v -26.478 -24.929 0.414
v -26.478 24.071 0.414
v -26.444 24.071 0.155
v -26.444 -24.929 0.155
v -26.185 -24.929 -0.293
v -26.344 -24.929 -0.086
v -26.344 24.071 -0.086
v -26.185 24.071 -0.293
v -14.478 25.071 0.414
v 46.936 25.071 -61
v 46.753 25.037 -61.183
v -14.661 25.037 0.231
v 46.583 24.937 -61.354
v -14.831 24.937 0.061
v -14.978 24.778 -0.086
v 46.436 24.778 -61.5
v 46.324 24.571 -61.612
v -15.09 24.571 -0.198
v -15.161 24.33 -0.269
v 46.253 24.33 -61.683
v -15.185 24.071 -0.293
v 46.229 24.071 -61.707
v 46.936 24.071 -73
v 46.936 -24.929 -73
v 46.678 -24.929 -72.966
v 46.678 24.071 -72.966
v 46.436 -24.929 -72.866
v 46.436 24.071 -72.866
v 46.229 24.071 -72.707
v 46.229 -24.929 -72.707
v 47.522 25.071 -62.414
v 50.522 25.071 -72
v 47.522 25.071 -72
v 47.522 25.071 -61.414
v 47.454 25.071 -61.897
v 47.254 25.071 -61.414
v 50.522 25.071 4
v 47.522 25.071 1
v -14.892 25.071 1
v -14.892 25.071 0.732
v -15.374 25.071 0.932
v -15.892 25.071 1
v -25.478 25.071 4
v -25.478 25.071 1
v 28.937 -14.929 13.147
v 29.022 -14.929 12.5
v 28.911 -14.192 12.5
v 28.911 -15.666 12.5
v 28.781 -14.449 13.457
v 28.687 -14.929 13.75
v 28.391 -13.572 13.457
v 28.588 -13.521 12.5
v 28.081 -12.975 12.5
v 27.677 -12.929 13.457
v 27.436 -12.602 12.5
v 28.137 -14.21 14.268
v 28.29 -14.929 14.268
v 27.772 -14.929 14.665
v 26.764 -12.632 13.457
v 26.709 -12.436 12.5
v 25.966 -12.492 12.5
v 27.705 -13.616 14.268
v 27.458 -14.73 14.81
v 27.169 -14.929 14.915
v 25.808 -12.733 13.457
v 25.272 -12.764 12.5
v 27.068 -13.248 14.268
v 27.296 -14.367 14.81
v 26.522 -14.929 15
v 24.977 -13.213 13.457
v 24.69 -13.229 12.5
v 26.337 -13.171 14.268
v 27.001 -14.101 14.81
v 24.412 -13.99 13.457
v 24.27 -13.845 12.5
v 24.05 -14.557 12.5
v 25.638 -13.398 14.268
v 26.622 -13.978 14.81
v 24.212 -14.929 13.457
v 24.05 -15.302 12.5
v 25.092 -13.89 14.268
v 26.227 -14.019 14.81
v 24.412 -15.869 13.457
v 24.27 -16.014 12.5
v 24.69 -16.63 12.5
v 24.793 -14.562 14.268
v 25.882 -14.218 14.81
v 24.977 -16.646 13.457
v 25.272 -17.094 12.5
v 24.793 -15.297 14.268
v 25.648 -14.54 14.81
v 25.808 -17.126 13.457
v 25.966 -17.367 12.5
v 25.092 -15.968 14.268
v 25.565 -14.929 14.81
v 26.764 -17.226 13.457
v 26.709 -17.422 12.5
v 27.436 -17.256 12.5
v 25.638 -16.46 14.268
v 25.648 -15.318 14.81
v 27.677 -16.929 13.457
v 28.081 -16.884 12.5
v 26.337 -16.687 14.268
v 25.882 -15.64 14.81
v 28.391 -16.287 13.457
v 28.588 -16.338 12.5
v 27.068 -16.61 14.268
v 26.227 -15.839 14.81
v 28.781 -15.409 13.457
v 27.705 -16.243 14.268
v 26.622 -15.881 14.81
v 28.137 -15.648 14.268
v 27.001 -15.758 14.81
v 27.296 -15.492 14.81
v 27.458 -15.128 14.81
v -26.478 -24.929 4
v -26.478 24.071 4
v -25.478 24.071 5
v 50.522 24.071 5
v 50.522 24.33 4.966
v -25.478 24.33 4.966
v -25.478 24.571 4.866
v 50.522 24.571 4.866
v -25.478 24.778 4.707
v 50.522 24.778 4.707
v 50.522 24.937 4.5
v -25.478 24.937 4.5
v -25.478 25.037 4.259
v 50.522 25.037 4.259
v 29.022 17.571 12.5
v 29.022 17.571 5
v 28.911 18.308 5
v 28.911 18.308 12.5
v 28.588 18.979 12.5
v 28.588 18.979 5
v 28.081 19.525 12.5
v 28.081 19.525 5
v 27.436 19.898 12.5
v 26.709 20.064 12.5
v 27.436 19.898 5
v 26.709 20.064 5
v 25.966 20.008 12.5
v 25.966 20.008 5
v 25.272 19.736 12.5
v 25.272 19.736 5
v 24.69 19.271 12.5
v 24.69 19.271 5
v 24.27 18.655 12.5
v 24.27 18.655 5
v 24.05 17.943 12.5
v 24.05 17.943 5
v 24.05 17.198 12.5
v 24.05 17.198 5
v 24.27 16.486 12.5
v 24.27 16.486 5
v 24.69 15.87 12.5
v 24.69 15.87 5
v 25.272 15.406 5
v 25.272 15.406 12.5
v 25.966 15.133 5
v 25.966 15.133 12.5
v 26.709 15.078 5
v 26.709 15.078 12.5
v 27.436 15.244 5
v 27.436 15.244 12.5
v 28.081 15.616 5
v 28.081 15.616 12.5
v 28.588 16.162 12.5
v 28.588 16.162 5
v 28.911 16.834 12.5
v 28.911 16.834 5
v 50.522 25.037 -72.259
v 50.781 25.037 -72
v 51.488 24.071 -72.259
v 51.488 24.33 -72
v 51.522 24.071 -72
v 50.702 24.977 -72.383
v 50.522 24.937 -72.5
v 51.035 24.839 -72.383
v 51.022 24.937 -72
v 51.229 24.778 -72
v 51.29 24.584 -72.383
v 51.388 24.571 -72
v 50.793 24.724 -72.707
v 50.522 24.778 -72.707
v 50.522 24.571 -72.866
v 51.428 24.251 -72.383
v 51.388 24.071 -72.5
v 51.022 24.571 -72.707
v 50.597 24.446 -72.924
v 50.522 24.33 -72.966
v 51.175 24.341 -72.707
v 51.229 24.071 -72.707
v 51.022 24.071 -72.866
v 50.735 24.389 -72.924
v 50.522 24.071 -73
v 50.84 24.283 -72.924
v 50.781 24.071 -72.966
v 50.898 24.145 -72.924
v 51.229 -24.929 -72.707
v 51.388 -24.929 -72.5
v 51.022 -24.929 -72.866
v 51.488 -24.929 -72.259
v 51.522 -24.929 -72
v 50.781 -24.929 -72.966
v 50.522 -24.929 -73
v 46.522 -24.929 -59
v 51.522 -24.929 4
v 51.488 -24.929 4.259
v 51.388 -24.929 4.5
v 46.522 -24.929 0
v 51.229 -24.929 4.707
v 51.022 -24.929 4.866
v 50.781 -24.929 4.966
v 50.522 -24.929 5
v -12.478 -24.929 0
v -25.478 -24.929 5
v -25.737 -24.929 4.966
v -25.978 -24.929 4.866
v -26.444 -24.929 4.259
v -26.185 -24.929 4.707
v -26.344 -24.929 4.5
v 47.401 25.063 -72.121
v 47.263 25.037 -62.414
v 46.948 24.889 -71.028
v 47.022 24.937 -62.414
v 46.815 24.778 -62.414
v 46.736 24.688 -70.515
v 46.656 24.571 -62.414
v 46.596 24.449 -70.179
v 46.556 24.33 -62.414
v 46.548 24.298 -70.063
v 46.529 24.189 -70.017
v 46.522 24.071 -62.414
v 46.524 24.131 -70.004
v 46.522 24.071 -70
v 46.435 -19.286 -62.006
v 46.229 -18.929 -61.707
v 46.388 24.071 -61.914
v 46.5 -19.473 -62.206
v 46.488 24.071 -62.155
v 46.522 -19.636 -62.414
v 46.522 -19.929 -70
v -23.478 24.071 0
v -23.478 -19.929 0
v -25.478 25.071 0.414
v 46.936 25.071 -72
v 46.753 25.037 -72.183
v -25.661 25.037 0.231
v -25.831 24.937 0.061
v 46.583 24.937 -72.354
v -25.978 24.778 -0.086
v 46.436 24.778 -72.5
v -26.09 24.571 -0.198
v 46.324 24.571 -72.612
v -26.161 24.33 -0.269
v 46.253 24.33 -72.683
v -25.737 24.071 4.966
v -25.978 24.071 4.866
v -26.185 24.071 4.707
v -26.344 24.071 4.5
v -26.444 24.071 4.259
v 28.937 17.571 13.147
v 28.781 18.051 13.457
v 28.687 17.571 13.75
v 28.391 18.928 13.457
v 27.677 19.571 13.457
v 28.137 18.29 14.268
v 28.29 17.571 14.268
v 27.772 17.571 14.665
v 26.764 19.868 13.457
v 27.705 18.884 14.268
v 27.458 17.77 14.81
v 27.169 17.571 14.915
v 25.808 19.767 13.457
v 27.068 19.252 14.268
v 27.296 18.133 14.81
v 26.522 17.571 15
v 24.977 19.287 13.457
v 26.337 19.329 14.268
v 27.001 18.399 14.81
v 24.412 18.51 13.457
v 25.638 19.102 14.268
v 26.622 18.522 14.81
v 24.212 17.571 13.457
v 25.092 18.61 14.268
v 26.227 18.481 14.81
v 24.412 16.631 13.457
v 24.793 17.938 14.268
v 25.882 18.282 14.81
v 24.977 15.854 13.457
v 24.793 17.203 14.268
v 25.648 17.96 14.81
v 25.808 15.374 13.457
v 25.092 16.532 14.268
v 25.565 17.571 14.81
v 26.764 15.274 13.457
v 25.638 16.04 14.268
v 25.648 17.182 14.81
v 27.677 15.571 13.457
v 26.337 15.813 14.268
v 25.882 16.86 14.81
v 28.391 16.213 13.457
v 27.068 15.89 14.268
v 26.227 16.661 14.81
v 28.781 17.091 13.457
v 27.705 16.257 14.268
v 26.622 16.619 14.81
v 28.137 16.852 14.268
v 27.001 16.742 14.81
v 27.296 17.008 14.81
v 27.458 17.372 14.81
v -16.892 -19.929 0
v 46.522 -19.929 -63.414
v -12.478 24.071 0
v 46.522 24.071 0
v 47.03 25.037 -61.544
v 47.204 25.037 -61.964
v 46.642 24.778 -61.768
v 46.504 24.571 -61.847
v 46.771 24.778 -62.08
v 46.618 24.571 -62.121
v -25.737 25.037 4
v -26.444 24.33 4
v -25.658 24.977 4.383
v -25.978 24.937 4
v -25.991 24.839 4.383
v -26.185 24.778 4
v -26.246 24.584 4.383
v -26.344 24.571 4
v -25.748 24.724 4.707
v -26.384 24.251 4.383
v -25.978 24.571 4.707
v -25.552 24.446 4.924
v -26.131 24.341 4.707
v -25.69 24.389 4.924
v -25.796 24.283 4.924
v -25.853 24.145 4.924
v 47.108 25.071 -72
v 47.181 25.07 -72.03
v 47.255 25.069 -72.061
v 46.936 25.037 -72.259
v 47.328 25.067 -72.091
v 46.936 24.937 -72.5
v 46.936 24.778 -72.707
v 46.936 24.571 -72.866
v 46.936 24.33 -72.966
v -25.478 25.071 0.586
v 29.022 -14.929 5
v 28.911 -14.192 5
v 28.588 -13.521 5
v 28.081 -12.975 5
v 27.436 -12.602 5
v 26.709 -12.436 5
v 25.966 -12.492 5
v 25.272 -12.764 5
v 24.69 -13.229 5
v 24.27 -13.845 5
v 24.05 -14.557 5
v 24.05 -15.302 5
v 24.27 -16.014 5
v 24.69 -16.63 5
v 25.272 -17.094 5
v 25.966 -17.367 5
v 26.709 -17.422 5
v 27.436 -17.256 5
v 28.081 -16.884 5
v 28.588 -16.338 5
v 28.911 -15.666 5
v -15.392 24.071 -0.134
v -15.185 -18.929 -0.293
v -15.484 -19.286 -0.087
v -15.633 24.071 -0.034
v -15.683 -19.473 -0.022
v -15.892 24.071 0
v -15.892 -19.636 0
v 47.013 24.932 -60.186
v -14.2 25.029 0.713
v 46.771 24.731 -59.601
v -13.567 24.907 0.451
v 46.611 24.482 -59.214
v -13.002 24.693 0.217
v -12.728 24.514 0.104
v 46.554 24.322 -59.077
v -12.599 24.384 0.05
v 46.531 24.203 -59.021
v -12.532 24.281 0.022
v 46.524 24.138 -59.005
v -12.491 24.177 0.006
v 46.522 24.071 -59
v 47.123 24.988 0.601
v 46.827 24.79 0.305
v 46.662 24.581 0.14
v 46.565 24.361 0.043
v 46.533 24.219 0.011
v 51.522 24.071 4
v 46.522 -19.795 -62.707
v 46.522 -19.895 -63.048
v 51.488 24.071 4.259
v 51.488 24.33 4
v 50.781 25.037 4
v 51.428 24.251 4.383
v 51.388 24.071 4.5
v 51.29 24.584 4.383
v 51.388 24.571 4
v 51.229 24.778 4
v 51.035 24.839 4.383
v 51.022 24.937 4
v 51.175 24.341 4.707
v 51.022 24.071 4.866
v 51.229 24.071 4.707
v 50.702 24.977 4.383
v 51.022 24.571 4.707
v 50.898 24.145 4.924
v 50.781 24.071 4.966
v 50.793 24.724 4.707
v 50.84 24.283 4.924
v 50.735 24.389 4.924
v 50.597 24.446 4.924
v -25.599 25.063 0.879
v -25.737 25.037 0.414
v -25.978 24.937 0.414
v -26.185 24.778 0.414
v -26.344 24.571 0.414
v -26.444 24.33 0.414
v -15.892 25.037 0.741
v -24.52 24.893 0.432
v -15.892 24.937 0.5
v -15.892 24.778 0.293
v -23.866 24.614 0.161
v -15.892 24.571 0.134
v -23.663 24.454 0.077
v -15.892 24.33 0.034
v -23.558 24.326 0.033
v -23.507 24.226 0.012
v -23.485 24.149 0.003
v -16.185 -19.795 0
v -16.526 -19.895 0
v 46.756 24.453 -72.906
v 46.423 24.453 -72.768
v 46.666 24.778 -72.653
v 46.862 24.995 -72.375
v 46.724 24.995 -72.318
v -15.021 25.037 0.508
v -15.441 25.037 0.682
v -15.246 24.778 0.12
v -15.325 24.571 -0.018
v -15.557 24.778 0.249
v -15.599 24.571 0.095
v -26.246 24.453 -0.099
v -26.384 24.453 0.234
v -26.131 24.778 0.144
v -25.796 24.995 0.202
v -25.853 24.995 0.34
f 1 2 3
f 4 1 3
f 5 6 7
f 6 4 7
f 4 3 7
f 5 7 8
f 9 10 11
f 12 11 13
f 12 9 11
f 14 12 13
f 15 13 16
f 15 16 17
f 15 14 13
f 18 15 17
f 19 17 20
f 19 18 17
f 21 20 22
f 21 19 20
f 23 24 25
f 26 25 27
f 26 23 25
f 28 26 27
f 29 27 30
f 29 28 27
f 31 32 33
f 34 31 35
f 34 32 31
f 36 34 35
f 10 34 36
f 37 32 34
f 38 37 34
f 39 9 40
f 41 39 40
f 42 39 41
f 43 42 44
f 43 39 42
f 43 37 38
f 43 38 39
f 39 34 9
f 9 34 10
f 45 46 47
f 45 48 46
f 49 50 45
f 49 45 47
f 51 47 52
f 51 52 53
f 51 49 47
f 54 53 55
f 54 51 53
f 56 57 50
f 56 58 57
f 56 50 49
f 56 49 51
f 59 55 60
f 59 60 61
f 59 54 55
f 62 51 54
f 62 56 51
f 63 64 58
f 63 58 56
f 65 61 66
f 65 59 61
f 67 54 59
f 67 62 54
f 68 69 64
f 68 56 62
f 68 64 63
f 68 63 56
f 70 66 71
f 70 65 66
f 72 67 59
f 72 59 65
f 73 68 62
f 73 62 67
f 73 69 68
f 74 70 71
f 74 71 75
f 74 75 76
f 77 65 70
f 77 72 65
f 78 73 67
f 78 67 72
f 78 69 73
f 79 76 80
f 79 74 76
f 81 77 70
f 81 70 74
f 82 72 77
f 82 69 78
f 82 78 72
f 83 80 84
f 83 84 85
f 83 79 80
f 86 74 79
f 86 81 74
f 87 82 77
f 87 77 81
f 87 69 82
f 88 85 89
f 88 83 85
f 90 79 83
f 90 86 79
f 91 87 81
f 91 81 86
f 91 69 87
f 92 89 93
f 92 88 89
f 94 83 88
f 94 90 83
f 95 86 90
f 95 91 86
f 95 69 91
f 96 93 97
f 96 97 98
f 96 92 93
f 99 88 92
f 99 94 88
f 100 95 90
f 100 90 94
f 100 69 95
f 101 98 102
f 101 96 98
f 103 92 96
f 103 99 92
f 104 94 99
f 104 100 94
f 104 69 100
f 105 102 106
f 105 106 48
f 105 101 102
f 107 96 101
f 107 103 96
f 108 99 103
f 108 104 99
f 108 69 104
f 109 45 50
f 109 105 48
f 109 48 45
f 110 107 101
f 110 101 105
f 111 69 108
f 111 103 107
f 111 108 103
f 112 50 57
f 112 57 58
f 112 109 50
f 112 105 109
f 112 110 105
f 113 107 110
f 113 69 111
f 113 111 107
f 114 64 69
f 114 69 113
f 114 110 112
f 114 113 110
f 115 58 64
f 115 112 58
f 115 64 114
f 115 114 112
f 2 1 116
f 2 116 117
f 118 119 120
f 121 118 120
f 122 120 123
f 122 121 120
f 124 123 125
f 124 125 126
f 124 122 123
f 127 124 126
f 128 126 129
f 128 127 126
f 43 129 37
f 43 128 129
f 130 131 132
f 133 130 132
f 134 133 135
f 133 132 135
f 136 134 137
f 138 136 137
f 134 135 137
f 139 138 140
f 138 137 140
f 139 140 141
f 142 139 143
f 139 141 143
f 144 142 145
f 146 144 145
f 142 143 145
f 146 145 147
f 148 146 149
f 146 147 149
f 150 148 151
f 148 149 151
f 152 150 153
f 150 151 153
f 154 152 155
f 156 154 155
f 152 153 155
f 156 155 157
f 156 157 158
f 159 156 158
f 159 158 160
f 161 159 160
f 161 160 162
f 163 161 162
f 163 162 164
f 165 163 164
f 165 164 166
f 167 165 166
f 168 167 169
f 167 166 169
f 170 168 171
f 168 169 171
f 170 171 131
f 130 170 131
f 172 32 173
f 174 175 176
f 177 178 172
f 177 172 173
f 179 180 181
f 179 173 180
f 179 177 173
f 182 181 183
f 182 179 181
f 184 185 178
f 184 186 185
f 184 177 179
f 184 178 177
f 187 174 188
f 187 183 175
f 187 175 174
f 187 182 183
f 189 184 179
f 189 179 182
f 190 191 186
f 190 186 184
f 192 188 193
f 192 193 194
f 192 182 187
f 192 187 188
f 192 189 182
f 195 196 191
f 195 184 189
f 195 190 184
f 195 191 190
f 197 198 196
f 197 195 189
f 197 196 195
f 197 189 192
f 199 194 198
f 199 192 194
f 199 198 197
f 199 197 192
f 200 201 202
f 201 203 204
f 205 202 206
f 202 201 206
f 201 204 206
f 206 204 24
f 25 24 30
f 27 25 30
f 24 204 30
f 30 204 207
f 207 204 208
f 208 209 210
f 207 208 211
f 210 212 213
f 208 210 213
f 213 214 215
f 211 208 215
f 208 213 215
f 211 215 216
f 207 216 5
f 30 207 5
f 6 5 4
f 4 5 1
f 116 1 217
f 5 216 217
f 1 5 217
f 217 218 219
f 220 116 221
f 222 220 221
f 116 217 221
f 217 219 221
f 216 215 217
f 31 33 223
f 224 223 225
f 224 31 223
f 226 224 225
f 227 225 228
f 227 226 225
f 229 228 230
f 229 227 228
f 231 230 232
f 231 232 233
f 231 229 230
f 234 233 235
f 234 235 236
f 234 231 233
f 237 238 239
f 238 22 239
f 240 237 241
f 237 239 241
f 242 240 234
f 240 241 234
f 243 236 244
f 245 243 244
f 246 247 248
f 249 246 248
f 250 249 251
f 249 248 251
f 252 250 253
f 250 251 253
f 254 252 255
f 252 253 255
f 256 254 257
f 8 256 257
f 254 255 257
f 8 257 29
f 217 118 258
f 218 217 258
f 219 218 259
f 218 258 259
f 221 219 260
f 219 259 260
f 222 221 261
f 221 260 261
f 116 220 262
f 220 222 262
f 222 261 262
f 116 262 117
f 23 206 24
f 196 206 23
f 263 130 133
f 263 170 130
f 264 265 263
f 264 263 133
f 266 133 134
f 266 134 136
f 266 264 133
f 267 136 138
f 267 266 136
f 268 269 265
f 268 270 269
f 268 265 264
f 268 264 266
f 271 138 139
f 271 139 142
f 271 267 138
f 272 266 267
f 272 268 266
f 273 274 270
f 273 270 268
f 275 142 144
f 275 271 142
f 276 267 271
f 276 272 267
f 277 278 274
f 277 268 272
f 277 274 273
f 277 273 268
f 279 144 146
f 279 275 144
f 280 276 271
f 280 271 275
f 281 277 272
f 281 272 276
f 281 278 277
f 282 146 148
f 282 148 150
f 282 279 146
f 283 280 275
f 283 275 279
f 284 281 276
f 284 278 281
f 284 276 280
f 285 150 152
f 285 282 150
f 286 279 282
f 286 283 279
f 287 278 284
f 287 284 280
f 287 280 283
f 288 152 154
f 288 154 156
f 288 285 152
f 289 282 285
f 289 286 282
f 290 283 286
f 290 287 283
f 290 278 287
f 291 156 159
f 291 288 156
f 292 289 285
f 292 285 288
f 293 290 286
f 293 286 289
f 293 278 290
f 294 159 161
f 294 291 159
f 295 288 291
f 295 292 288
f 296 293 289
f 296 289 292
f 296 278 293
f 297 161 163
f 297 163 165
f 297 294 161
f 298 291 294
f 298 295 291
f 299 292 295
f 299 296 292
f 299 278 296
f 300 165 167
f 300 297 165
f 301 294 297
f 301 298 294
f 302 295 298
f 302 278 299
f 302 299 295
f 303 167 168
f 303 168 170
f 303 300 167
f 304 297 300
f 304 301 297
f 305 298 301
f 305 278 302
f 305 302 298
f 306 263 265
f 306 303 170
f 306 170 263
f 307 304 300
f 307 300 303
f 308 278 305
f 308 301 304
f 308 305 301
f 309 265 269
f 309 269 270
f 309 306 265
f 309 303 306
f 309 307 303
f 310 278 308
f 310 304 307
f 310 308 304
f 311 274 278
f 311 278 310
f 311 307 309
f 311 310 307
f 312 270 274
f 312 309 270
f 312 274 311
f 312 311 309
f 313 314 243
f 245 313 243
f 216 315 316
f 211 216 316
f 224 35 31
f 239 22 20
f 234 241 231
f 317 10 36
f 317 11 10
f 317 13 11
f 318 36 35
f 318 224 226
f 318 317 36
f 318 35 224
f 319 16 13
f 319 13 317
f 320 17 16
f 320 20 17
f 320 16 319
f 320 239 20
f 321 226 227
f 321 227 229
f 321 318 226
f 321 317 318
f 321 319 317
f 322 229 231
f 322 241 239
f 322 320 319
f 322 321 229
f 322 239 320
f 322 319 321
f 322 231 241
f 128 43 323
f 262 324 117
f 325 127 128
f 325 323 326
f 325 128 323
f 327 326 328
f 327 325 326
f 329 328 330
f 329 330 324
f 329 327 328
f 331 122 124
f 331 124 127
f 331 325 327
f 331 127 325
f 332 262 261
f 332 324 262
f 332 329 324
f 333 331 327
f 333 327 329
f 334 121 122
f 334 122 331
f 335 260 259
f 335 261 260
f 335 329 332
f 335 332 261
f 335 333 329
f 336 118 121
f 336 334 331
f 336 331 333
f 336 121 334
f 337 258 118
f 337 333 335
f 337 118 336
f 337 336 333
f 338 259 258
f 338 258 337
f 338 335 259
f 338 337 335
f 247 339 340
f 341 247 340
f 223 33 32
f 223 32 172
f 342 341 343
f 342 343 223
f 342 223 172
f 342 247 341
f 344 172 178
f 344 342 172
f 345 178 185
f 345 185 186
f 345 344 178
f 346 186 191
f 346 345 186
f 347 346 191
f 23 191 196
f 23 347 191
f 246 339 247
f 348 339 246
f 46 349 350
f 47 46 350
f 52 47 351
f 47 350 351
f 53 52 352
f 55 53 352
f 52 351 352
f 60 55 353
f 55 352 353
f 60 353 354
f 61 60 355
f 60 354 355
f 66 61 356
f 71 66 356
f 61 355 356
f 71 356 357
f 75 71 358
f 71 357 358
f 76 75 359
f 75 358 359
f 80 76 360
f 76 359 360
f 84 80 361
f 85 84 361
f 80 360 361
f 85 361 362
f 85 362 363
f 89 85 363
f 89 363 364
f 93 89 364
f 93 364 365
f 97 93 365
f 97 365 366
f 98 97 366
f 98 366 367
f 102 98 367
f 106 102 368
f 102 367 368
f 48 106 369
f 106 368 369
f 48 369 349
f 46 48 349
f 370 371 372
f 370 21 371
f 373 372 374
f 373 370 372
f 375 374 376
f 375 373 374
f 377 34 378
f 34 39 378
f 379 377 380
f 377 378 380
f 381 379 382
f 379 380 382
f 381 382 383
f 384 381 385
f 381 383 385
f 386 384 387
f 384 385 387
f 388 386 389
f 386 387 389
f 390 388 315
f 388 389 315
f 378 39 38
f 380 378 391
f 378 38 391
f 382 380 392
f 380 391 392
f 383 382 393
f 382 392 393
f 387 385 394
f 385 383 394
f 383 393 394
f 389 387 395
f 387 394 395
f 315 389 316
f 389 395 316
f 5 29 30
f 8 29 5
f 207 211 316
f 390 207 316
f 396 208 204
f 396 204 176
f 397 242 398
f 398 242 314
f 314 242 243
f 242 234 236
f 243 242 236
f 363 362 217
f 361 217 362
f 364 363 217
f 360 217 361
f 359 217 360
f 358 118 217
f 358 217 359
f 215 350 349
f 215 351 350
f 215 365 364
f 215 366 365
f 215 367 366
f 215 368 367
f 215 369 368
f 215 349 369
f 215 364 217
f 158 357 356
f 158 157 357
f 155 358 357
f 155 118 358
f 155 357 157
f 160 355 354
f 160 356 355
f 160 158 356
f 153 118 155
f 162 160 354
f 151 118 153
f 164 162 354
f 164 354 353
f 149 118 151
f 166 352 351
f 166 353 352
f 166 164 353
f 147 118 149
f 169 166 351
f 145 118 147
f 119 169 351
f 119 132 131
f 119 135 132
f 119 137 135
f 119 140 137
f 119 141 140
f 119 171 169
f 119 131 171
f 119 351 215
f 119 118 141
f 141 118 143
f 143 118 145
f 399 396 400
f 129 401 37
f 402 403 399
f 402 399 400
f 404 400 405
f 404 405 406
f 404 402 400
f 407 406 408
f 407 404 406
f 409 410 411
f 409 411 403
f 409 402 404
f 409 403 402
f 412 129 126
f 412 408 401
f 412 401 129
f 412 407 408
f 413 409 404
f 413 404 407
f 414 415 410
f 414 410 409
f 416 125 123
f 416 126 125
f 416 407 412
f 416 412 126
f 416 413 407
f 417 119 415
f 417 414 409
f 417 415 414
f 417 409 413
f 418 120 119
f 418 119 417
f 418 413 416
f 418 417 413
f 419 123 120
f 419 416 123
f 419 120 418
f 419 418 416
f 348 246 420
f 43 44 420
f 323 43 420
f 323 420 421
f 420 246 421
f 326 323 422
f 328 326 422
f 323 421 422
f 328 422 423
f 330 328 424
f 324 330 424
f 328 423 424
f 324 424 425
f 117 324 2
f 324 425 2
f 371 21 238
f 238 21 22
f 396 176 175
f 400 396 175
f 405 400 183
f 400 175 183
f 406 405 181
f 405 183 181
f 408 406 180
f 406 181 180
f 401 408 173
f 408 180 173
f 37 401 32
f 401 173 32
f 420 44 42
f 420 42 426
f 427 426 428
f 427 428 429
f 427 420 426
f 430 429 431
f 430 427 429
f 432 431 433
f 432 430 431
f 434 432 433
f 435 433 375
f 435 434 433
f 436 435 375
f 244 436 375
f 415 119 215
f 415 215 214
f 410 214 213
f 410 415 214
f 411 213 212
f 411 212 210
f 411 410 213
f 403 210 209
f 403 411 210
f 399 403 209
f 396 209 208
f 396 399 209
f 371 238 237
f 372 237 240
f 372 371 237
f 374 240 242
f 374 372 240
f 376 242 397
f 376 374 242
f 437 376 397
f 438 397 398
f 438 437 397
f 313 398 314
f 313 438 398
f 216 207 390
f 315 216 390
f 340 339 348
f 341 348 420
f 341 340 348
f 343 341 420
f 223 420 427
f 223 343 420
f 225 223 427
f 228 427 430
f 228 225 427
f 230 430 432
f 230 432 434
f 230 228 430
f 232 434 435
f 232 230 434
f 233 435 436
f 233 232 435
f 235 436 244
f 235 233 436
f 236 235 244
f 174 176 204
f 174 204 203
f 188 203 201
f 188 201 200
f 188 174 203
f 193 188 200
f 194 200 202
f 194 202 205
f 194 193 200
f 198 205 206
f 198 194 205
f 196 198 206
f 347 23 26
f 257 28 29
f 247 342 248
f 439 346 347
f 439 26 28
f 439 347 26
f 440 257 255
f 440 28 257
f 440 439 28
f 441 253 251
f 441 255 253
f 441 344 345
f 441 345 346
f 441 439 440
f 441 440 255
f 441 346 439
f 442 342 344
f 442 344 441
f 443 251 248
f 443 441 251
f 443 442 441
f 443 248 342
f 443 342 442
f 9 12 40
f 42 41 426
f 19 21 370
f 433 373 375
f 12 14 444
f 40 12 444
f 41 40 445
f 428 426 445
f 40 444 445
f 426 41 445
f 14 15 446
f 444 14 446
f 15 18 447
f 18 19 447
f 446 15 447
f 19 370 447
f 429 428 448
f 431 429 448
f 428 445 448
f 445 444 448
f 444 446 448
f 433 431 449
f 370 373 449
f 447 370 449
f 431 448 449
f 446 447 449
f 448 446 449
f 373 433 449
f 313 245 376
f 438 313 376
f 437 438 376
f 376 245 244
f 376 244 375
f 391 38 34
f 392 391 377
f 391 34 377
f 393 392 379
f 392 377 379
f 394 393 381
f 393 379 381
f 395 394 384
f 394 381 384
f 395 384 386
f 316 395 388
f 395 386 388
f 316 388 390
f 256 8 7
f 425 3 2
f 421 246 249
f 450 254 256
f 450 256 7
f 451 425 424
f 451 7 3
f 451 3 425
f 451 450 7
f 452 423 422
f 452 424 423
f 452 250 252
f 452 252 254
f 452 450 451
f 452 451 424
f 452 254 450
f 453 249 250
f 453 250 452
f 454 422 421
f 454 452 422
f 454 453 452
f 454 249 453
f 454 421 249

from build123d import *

# Parameters (mm, degrees)
F0_W           = 78
F0_H           = 50
F1_DEPTH       = 5
F2_R           = 2.5
F3_DEPTH       = 10
F4_R           = 2.5
F5_W           = 50
F5_H           = 78
F6_DEPTH       = 5
F8_DEPTH       = 50
F10_DEPTH      = 45
F11_T1_DEPTH   = 46.0355339059
F11_T3_DEPTH   = 92.6812408671
F11_T5_DEPTH   = 86.8528137424
F11_T7_DEPTH   = 76
F11_T9_DEPTH   = 76
F11_T11_DEPTH  = 3.5857864376
F11_T13_DEPTH  = 102.4091629285
F11_T15_DEPTH  = 3.5857864376
F11_T17_DEPTH  = 51.5
F11_T19_DEPTH  = 50.0355339059
F11_S23_W      = 1.02
F11_S23_H      = 1.02
F11_T24_DEPTH  = 1.02
F11_S29_W      = 1.02
F11_S29_H      = 1.02
F11_T30_DEPTH  = 1.02
F11_S35_W      = 1.02
F11_S35_H      = 1.02
F11_T36_DEPTH  = 1.02
F11_T42_DEPTH  = 1.02
F11_T48_DEPTH  = 1.02
F11_T54_DEPTH  = 61.5
F11_T59_DEPTH  = 61.5
F11_T64_DEPTH  = 88.43860018
F11_T70_DEPTH  = 103.9949493661
F11_T76_DEPTH  = 10.0857864376
F11_T81_DEPTH  = 10.0857864376
F11_T84_ANGLE  = 45
F11_T86_ANGLE  = 45
F11_T91_DEPTH  = 64
F11_T95_DEPTH  = 64
F11_T102_DEPTH = 61.5
F11_T106_DEPTH = 88.43860018
F11_T113_DEPTH = 61.5
F11_T117_DEPTH = 88.43860018
F11_T124_DEPTH = 10.0857864376
F11_T128_DEPTH = 103.9949493661
F11_T135_DEPTH = 103.9949493661
F11_T139_DEPTH = 10.0857864376


# Not quite as in the source:
# - a fillet or chamfer that OpenCascade refuses, or shapes differently, is made with other operations: its cross-section is extruded or revolved along the edge and cut away or added


with BuildPart() as f1:
    # F0 (on Top) → F1 (new body)
    with BuildSketch(Plane.XY):
        with Locations((12.5221835672, 0.070781447)):
            Rectangle(F0_W, F0_H)
    extrude(amount=F1_DEPTH)

    # F2 (on face) → F3 (join)
    with BuildSketch(Plane.XY.offset(5)):
        with Locations((26.5221835672, 17.570781447)):
            Circle(F2_R)
        with Locations((26.5221835672, -14.929218553)):
            Circle(F2_R)
    extrude(amount=F3_DEPTH)

    # F4
    f4_edges = [f1.edges().sort_by_distance(p)[0] for p in [
        (24.022184, 17.570781, 15),
        (24.022184, -14.929219, 15),
    ]]
    fillet(f4_edges, radius=F4_R)

    # F5 (on face) → F6 (join)
    with BuildSketch(Plane.YZ.offset(51.5221835672)):
        with Locations((0.070781447, -34)):
            Rectangle(F5_W, F5_H)
    extrude(amount=-F6_DEPTH)

    # F7 (on face) → F8 (join)
    with BuildSketch(Plane(origin=(0, 25.070781447, 0), x_dir=(-1, 0, 0), z_dir=(0, 1, 0))):
        Polygon((-46.5221835672, -73), (26.4778164328, 0), (12.4778164328, 0), (-46.5221835672, -59), align=None)
    extrude(amount=-F8_DEPTH)

    # F9 (on face) → F10 (cut)
    with BuildSketch(Plane(origin=(0, 25.070781447, 0), x_dir=(-1, 0, 0), z_dir=(0, 1, 0))):
        Polygon((15.4778164328, 0), (-46.5221835672, -62), (-46.5221835672, -70), (23.4778164328, 0), align=None)
    extrude(amount=-F10_DEPTH, mode=Mode.SUBTRACT)

    # F11: fillet of radius 1 on 20 edges, made by hand

    # F11_s2 → F11_t1 (join)
    with BuildSketch(Plane.XZ.offset(-25.070781447)):
        with BuildLine():
            ThreePointArc((-15.1849232139, -0.2928932188), (-15.5093465628, -0.0761204675), (-15.8920299951, 0))
            Line((-15.8920299951, 0), (-15.4778164328, 0))
            Line((-15.4778164328, 0), (-15.1849232139, -0.2928932188))
        make_face()
        with BuildLine():
            ThreePointArc((46.2292903484, -61.7071067812), (46.4460630998, -62.03153013), (46.5221835672, -62.4142135624))
            Line((46.5221835672, -62.4142135624), (46.5221835672, -62))
            Line((46.5221835672, -62), (46.2292903484, -61.7071067812))
        make_face()
    extrude(amount=F11_T1_DEPTH)

    # F11_s4 → F11_t3 (join)
    with BuildSketch(Plane(origin=(-9.5066751693, 0, 9.5066751693), x_dir=(0, 1, 0), z_dir=(0.7071067812, 0, -0.7071067812))):
        with BuildLine():
            ThreePointArc((-18.929218553, -10.9444689576), (-19.6363253342, -11.2373621764), (-19.929218553, -11.9444689576))
            Line((-19.929218553, -11.9444689576), (-19.929218553, -10.9444689576))
            Line((-19.929218553, -10.9444689576), (-18.929218553, -10.9444689576))
        make_face()
    extrude(amount=F11_T3_DEPTH)

    # F11_s6 → F11_t5 (cut)
    with BuildSketch(Plane(origin=(-7.4460149976, 0, 7.4460149976), x_dir=(0, 1, 0), z_dir=(0.7071067812, 0, -0.7071067812))):
        with BuildLine():
            ThreePointArc((25.070781447, -9.9444689576), (24.7778882282, -10.6515757388), (24.070781447, -10.9444689576))
            Line((24.070781447, -10.9444689576), (25.070781447, -10.9444689576))
            Line((25.070781447, -10.9444689576), (25.070781447, -9.9444689576))
        make_face()
    extrude(amount=F11_T5_DEPTH, mode=Mode.SUBTRACT)

    # F11_s8 → F11_t7 (cut)
    with BuildSketch(Plane.YZ.offset(-25.4778164328)):
        with BuildLine():
            ThreePointArc((24.070781447, 5), (24.7778882282, 4.7071067812), (25.070781447, 4))
            Line((25.070781447, 4), (25.070781447, 5))
            Line((25.070781447, 5), (24.070781447, 5))
        make_face()
    extrude(amount=F11_T7_DEPTH, mode=Mode.SUBTRACT)

    # F11_s10 → F11_t9 (cut)
    with BuildSketch(Plane.XY.offset(-72)):
        with BuildLine():
            ThreePointArc((51.5221835672, 24.070781447), (51.2292903484, 24.7778882282), (50.5221835672, 25.070781447))
            Line((50.5221835672, 25.070781447), (51.5221835672, 25.070781447))
            Line((51.5221835672, 25.070781447), (51.5221835672, 24.070781447))
        make_face()
    extrude(amount=F11_T9_DEPTH, mode=Mode.SUBTRACT)

    # F11_s12 → F11_t11 (cut)
    with BuildSketch(Plane.YZ.offset(46.9363971296)):
        with BuildLine():
            ThreePointArc((25.070781447, -72), (24.7778882282, -72.7071067812), (24.070781447, -73))
            Line((24.070781447, -73), (25.070781447, -73))
            Line((25.070781447, -73), (25.070781447, -72))
        make_face()
    extrude(amount=F11_T11_DEPTH, mode=Mode.SUBTRACT)

    # F11_s14 → F11_t13 (cut)
    with BuildSketch(Plane(origin=(59.4681985648, 0, -59.4681985648), x_dir=(0, 1, 0), z_dir=(-0.7071067812, 0, 0.7071067812))):
        with BuildLine():
            ThreePointArc((25.070781447, 17.7226435506), (24.7778882282, 18.4297503318), (24.070781447, 18.7226435506))
            Line((24.070781447, 18.7226435506), (25.070781447, 18.7226435506))
            Line((25.070781447, 18.7226435506), (25.070781447, 17.7226435506))
        make_face()
    extrude(amount=F11_T13_DEPTH, mode=Mode.SUBTRACT)

    # F11_s16 → F11_t15 (cut)
    with BuildSketch(Plane.XY.offset(0.4142135624)):
        with BuildLine():
            ThreePointArc((-25.4778164328, 25.070781447), (-26.1849232139, 24.7778882282), (-26.4778164328, 24.070781447))
            Line((-26.4778164328, 24.070781447), (-26.4778164328, 25.070781447))
            Line((-26.4778164328, 25.070781447), (-25.4778164328, 25.070781447))
        make_face()
    extrude(amount=F11_T15_DEPTH, mode=Mode.SUBTRACT)

    # F11_s18 → F11_t17 (cut)
    with BuildSketch(Plane.XZ.offset(-24.070781447)):
        with BuildLine():
            ThreePointArc((51.5221835672, -72), (51.2292903484, -72.7071067812), (50.5221835672, -73))
            Line((50.5221835672, -73), (51.5221835672, -73))
            Line((51.5221835672, -73), (51.5221835672, -72))
        make_face()
        with BuildLine():
            ThreePointArc((50.5221835672, 5), (51.2292903484, 4.7071067812), (51.5221835672, 4))
            Line((51.5221835672, 4), (51.5221835672, 5))
            Line((51.5221835672, 5), (50.5221835672, 5))
        make_face()
        with BuildLine():
            ThreePointArc((-25.4778164328, 5), (-26.1849232139, 4.7071067812), (-26.4778164328, 4))
            Line((-26.4778164328, 4), (-26.4778164328, 5))
            Line((-26.4778164328, 5), (-25.4778164328, 5))
        make_face()
    extrude(amount=F11_T17_DEPTH, mode=Mode.SUBTRACT)

    # F11_s20 → F11_t19 (cut)
    with BuildSketch(Plane.XZ.offset(-24.070781447)):
        with BuildLine():
            ThreePointArc((46.9363971296, -73), (46.5537136972, -72.9238795325), (46.2292903484, -72.7071067812))
            Line((46.2292903484, -72.7071067812), (46.5221835672, -73))
            Line((46.5221835672, -73), (46.9363971296, -73))
        make_face()
        with BuildLine():
            ThreePointArc((-26.4778164328, 0.4142135624), (-26.4016959653, 0.03153013), (-26.1849232139, -0.2928932188))
            Line((-26.1849232139, -0.2928932188), (-26.4778164328, 0))
            Line((-26.4778164328, 0), (-26.4778164328, 0.4142135624))
        make_face()
    extrude(amount=F11_T19_DEPTH, mode=Mode.SUBTRACT)


with BuildPart() as f11_tool22:
    # F11_s23 → F11_t24 (new body)
    with BuildSketch(Plane.XY.offset(4)):
        with Locations((51.0321835672, 24.580781447)):
            Rectangle(F11_S23_W, F11_S23_H)
    extrude(amount=F11_T24_DEPTH)

    # F11_s25 → F11_t26 (revolve, cut)
    with BuildSketch(Plane(origin=(50.5221835672, 24.070781447, 4), x_dir=(-0.7071067812, -0.7071067812, 0), z_dir=(-0.7071067812, 0.7071067812, 0))):
        with BuildLine():
            ThreePointArc((0, -1), (1, 0), (0, 1))
            Line((0, 1), (0, -1))
        make_face()
    revolve(axis=Axis((50.5221835672, 24.070781447, 4), (0, 0, 1)), mode=Mode.SUBTRACT)


with BuildPart() as f1_1:
    add(f1.part)

    # F11_t21: cut F11_tool22
    add(f11_tool22.part, mode=Mode.SUBTRACT)


with BuildPart() as f11_tool28:
    # F11_s29 → F11_t30 (new body)
    with BuildSketch(Plane.XY.offset(4)):
        with Locations((-25.9878164328, 24.580781447)):
            Rectangle(F11_S29_W, F11_S29_H)
    extrude(amount=F11_T30_DEPTH)

    # F11_s31 → F11_t32 (revolve, cut)
    with BuildSketch(Plane(origin=(-25.4778164328, 24.070781447, 4), x_dir=(0.7071067812, -0.7071067812, 0), z_dir=(-0.7071067812, -0.7071067812, 0))):
        with BuildLine():
            ThreePointArc((0, -1), (1, 0), (0, 1))
            Line((0, 1), (0, -1))
        make_face()
    revolve(axis=Axis((-25.4778164328, 24.070781447, 4), (0, 0, 1)), mode=Mode.SUBTRACT)


with BuildPart() as f1_2:
    add(f1_1.part)

    # F11_t27: cut F11_tool28
    add(f11_tool28.part, mode=Mode.SUBTRACT)


with BuildPart() as f11_tool34:
    # F11_s35 → F11_t36 (new body)
    with BuildSketch(Plane.XY.offset(-72)):
        with Locations((51.0321835672, 24.580781447)):
            Rectangle(F11_S35_W, F11_S35_H)
    extrude(amount=-F11_T36_DEPTH)

    # F11_s37 → F11_t38 (revolve, cut)
    with BuildSketch(Plane(origin=(50.5221835672, 24.070781447, -72), x_dir=(-0.7071067812, -0.7071067812, 0), z_dir=(0.7071067812, -0.7071067812, 0))):
        with BuildLine():
            ThreePointArc((0, -1), (1, 0), (0, 1))
            Line((0, 1), (0, -1))
        make_face()
    revolve(axis=Axis((50.5221835672, 24.070781447, -72), (0, 0, -1)), mode=Mode.SUBTRACT)


with BuildPart() as f1_3:
    add(f1_2.part)

    # F11_t33: cut F11_tool34
    add(f11_tool34.part, mode=Mode.SUBTRACT)


with BuildPart() as f11_tool40:
    # F11_s41 → F11_t42 (new body)
    with BuildSketch(Plane.XZ.offset(-24.070781447)):
        Polygon((46.9363971296, -72), (46.9363971296, -73.02), (46.513899296, -73.02), (46.2151482128, -72.7212489168), align=None)
    extrude(amount=-F11_T42_DEPTH)

    # F11_s43 → F11_t44 (revolve, cut)
    with BuildSketch(Plane(origin=(46.9363971296, 24.070781447, -72), x_dir=(0.3826834324, 0, 0.9238795325), z_dir=(-0.9238795325, 0, 0.3826834324))):
        with BuildLine():
            ThreePointArc((0, -1), (1, 0), (0, 1))
            Line((0, 1), (0, -1))
        make_face()
    revolve(axis=Axis((46.9363971296, 24.070781447, -72), (0, 1, 0)), mode=Mode.SUBTRACT)


with BuildPart() as f1_4:
    add(f1_3.part)

    # F11_t39: cut F11_tool40
    add(f11_tool40.part, mode=Mode.SUBTRACT)


with BuildPart() as f11_tool46:
    # F11_s47 → F11_t48 (new body)
    with BuildSketch(Plane.XZ.offset(-24.070781447)):
        Polygon((-25.4778164328, 0.4142135624), (-26.4978164328, 0.4142135624), (-26.4978164328, -0.0082842712), (-26.1990653496, -0.3070353544), align=None)
    extrude(amount=-F11_T48_DEPTH)

    # F11_s49 → F11_t50 (revolve, cut)
    with BuildSketch(Plane(origin=(-25.4778164328, 24.070781447, 0.4142135624), x_dir=(0.9238795325, 0, 0.3826834324), z_dir=(-0.3826834324, 0, 0.9238795325))):
        with BuildLine():
            ThreePointArc((0, -1), (1, 0), (0, 1))
            Line((0, 1), (0, -1))
        make_face()
    revolve(axis=Axis((-25.4778164328, 24.070781447, 0.4142135624), (0, 1, 0)), mode=Mode.SUBTRACT)


with BuildPart() as f1_5:
    add(f1_4.part)

    # F11_t45: cut F11_tool46
    add(f11_tool46.part, mode=Mode.SUBTRACT)


with BuildPart() as f11_tool52:
    # F11_s53 → F11_t54 (new body)
    with BuildSketch(Plane.YZ.offset(46.5221835672)):
        with BuildLine():
            ThreePointArc((25.070781447, 1), (24.7778882282, 0.2928932188), (24.070781447, 0))
            Line((24.070781447, 0), (25.070781447, 0))
            Line((25.070781447, 0), (25.070781447, 1))
        make_face()
    extrude(amount=-F11_T54_DEPTH)

    split(bisect_by=Plane(origin=(-6.2389082164, 0, -6.2389082164), x_dir=(0, 1, 0), z_dir=(0.7071067812, 0, 0.7071067812)), keep=Keep.TOP)


with BuildPart() as f1_6:
    add(f1_5.part)

    # F11_t51: cut F11_tool52
    add(f11_tool52.part, mode=Mode.SUBTRACT)


with BuildPart() as f11_tool57:
    # F11_s58 → F11_t59 (new body)
    with BuildSketch(Plane.XY.offset(-61.5)):
        with BuildLine():
            ThreePointArc((47.5221835672, 25.070781447), (46.8150767861, 24.7778882282), (46.5221835672, 24.070781447))
            Line((46.5221835672, 24.070781447), (46.5221835672, 25.070781447))
            Line((46.5221835672, 25.070781447), (47.5221835672, 25.070781447))
        make_face()
    extrude(amount=F11_T59_DEPTH)

    split(bisect_by=Plane(origin=(-6.2389082164, 0, -6.2389082164), x_dir=(0, 1, 0), z_dir=(0.7071067812, 0, 0.7071067812)), keep=Keep.TOP)


with BuildPart() as f1_7:
    add(f1_6.part)

    # F11_t56: cut F11_tool57
    add(f11_tool57.part, mode=Mode.SUBTRACT)


with BuildPart() as f11_tool62:
    # F11_s63 → F11_t64 (new body)
    with BuildSketch(Plane(origin=(-8.0066751693, 0, 8.0066751693), x_dir=(0, 1, 0), z_dir=(0.7071067812, 0, -0.7071067812))):
        with BuildLine():
            ThreePointArc((25.070781447, -9.823148614), (24.7778882282, -9.1160418328), (24.070781447, -8.823148614))
            Line((24.070781447, -8.823148614), (25.070781447, -8.823148614))
            Line((25.070781447, -8.823148614), (25.070781447, -9.823148614))
        make_face()
    extrude(amount=F11_T64_DEPTH)

    split(bisect_by=Plane.XY, keep=Keep.BOTTOM)

    split(bisect_by=Plane.YZ.offset(46.5221835672), keep=Keep.BOTTOM)


with BuildPart() as f1_8:
    add(f1_7.part)

    # F11_t61: cut F11_tool62
    add(f11_tool62.part, mode=Mode.SUBTRACT)


with BuildPart() as f11_tool68:
    # F11_s69 → F11_t70 (new body)
    with BuildSketch(Plane(origin=(60.0288587366, 0, -60.0288587366), x_dir=(0, 1, 0), z_dir=(-0.7071067812, 0, 0.7071067812))):
        with BuildLine():
            ThreePointArc((25.070781447, 17.6013232071), (24.7778882282, 16.8942164259), (24.070781447, 16.6013232071))
            Line((24.070781447, 16.6013232071), (25.070781447, 16.6013232071))
            Line((25.070781447, 16.6013232071), (25.070781447, 17.6013232071))
        make_face()
    extrude(amount=F11_T70_DEPTH)

    split(bisect_by=Plane.XY, keep=Keep.BOTTOM)

    split(bisect_by=Plane.YZ.offset(46.5221835672), keep=Keep.BOTTOM)


with BuildPart() as f1_9:
    add(f1_8.part)

    # F11_t67: cut F11_tool68
    add(f11_tool68.part, mode=Mode.SUBTRACT)


with BuildPart() as f11_tool74:
    # F11_s75 → F11_t76 (new body)
    with BuildSketch(Plane.YZ.offset(-25.9778164328)):
        with BuildLine():
            ThreePointArc((25.070781447, 1), (24.7778882282, 0.2928932188), (24.070781447, 0))
            Line((24.070781447, 0), (25.070781447, 0))
            Line((25.070781447, 0), (25.070781447, 1))
        make_face()
    extrude(amount=F11_T76_DEPTH)

    split(bisect_by=Plane(origin=(-11.7389082164, 0, -11.7389082164), x_dir=(0, 1, 0), z_dir=(0.7071067812, 0, 0.7071067812)), keep=Keep.TOP)


with BuildPart() as f1_10:
    add(f1_9.part)

    # F11_t73: cut F11_tool74
    add(f11_tool74.part, mode=Mode.SUBTRACT)


with BuildPart() as f11_tool79:
    # F11_s80 → F11_t81 (new body)
    with BuildSketch(Plane.XY.offset(-62.4142135624)):
        with BuildLine():
            ThreePointArc((47.5221835672, 25.070781447), (46.8150767861, 24.7778882282), (46.5221835672, 24.070781447))
            Line((46.5221835672, 24.070781447), (46.5221835672, 25.070781447))
            Line((46.5221835672, 25.070781447), (47.5221835672, 25.070781447))
        make_face()
    extrude(amount=-F11_T81_DEPTH)

    split(bisect_by=Plane(origin=(-11.7389082164, 0, -11.7389082164), x_dir=(0, 1, 0), z_dir=(0.7071067812, 0, 0.7071067812)), keep=Keep.TOP)


with BuildPart() as f1_11:
    add(f1_10.part)

    # F11_t78: cut F11_tool79
    add(f11_tool79.part, mode=Mode.SUBTRACT)

    # F11_s83 → F11_t84 (revolve, cut)
    with BuildSketch(Plane(origin=(53.9681985648, 0, -53.9681985648), x_dir=(0, 1, 0), z_dir=(-0.7071067812, 0, 0.7071067812))):
        with BuildLine():
            ThreePointArc((25.070781447, 9.9444689576), (24.7778882282, 10.6515757388), (24.070781447, 10.9444689576))
            Line((24.070781447, 10.9444689576), (25.070781447, 10.9444689576))
            Line((25.070781447, 10.9444689576), (25.070781447, 9.9444689576))
        make_face()
    revolve(axis=Axis((45.5221835672, 25.070781447, -62.4142135624), (0, 1, 0)), revolution_arc=F11_T84_ANGLE, mode=Mode.SUBTRACT)

    # F11_s85 → F11_t86 (revolve, cut)
    with BuildSketch(Plane(origin=(-7.4460149976, 0, 7.4460149976), x_dir=(0, 1, 0), z_dir=(0.7071067812, 0, -0.7071067812))):
        with BuildLine():
            ThreePointArc((25.070781447, -9.9444689576), (24.7778882282, -10.6515757388), (24.070781447, -10.9444689576))
            Line((24.070781447, -10.9444689576), (25.070781447, -10.9444689576))
            Line((25.070781447, -10.9444689576), (25.070781447, -9.9444689576))
        make_face()
    revolve(axis=Axis((-15.8920299951, 25.070781447, -1), (0, -1, 0)), revolution_arc=F11_T86_ANGLE, mode=Mode.SUBTRACT)


with BuildPart() as f11_tool89:
    # F11_s90 → F11_t91 (new body)
    with BuildSketch(Plane.YZ.offset(49.0221835672)):
        with BuildLine():
            ThreePointArc((25.070781447, 1), (24.7778882282, 0.2928932188), (24.070781447, 0))
            Line((24.070781447, 0), (25.070781447, 0))
            Line((25.070781447, 0), (25.070781447, 1))
        make_face()
    extrude(amount=-F11_T91_DEPTH)

    split(bisect_by=Plane.YZ.offset(46.5221835672), keep=Keep.TOP)


with BuildPart() as f11_tool93:
    # F11_s94 → F11_t95 (new body)
    with BuildSketch(Plane.XY.offset(-61.5)):
        with BuildLine():
            ThreePointArc((47.5221835672, 25.070781447), (46.8150767861, 24.7778882282), (46.5221835672, 24.070781447))
            Line((46.5221835672, 24.070781447), (46.5221835672, 25.070781447))
            Line((46.5221835672, 25.070781447), (47.5221835672, 25.070781447))
        make_face()
    extrude(amount=F11_T95_DEPTH)

    split(bisect_by=Plane.XY, keep=Keep.TOP)


with BuildPart() as f11_tool89_1:
    add(f11_tool89.part)

    # F11_t97: intersect F11_tool93
    add(f11_tool93.part, mode=Mode.INTERSECT)


with BuildPart() as f1_12:
    add(f1_11.part)

    # F11_t87: cut F11_tool89
    add(f11_tool89_1.part, mode=Mode.SUBTRACT)


with BuildPart() as f11_tool100:
    # F11_s101 → F11_t102 (new body)
    with BuildSketch(Plane.YZ.offset(46.5221835672)):
        with BuildLine():
            ThreePointArc((25.070781447, 1), (24.7778882282, 0.2928932188), (24.070781447, 0))
            Line((24.070781447, 0), (25.070781447, 0))
            Line((25.070781447, 0), (25.070781447, 1))
        make_face()
    extrude(amount=-F11_T102_DEPTH)

    split(bisect_by=Plane(origin=(-6.2389082164, 0, -6.2389082164), x_dir=(0, 1, 0), z_dir=(-0.7071067812, 0, -0.7071067812)), keep=Keep.TOP)


with BuildPart() as f11_tool104:
    # F11_s105 → F11_t106 (new body)
    with BuildSketch(Plane(origin=(-8.0066751693, 0, 8.0066751693), x_dir=(0, 1, 0), z_dir=(0.7071067812, 0, -0.7071067812))):
        with BuildLine():
            ThreePointArc((25.070781447, -9.823148614), (24.7778882282, -9.1160418328), (24.070781447, -8.823148614))
            Line((24.070781447, -8.823148614), (25.070781447, -8.823148614))
            Line((25.070781447, -8.823148614), (25.070781447, -9.823148614))
        make_face()
    extrude(amount=F11_T106_DEPTH)

    split(bisect_by=Plane.XY, keep=Keep.TOP)


with BuildPart() as f11_tool100_1:
    add(f11_tool100.part)

    # F11_t108: intersect F11_tool104
    add(f11_tool104.part, mode=Mode.INTERSECT)


with BuildPart() as f1_13:
    add(f1_12.part)

    # F11_t98: cut F11_tool100
    add(f11_tool100_1.part, mode=Mode.SUBTRACT)


with BuildPart() as f11_tool111:
    # F11_s112 → F11_t113 (new body)
    with BuildSketch(Plane.XY.offset(-61.5)):
        with BuildLine():
            ThreePointArc((47.5221835672, 25.070781447), (46.8150767861, 24.7778882282), (46.5221835672, 24.070781447))
            Line((46.5221835672, 24.070781447), (46.5221835672, 25.070781447))
            Line((46.5221835672, 25.070781447), (47.5221835672, 25.070781447))
        make_face()
    extrude(amount=F11_T113_DEPTH)

    split(bisect_by=Plane(origin=(-6.2389082164, 0, -6.2389082164), x_dir=(0, 1, 0), z_dir=(-0.7071067812, 0, -0.7071067812)), keep=Keep.TOP)


with BuildPart() as f11_tool115:
    # F11_s116 → F11_t117 (new body)
    with BuildSketch(Plane(origin=(-8.0066751693, 0, 8.0066751693), x_dir=(0, 1, 0), z_dir=(0.7071067812, 0, -0.7071067812))):
        with BuildLine():
            ThreePointArc((25.070781447, -9.823148614), (24.7778882282, -9.1160418328), (24.070781447, -8.823148614))
            Line((24.070781447, -8.823148614), (25.070781447, -8.823148614))
            Line((25.070781447, -8.823148614), (25.070781447, -9.823148614))
        make_face()
    extrude(amount=F11_T117_DEPTH)

    split(bisect_by=Plane.YZ.offset(46.5221835672), keep=Keep.TOP)


with BuildPart() as f11_tool111_1:
    add(f11_tool111.part)

    # F11_t119: intersect F11_tool115
    add(f11_tool115.part, mode=Mode.INTERSECT)


with BuildPart() as f1_14:
    add(f1_13.part)

    # F11_t109: cut F11_tool111
    add(f11_tool111_1.part, mode=Mode.SUBTRACT)


with BuildPart() as f11_tool122:
    # F11_s123 → F11_t124 (new body)
    with BuildSketch(Plane.XY.offset(-62.4142135624)):
        with BuildLine():
            ThreePointArc((47.5221835672, 25.070781447), (46.8150767861, 24.7778882282), (46.5221835672, 24.070781447))
            Line((46.5221835672, 24.070781447), (46.5221835672, 25.070781447))
            Line((46.5221835672, 25.070781447), (47.5221835672, 25.070781447))
        make_face()
    extrude(amount=-F11_T124_DEPTH)

    split(bisect_by=Plane(origin=(-11.7389082164, 0, -11.7389082164), x_dir=(0, 1, 0), z_dir=(-0.7071067812, 0, -0.7071067812)), keep=Keep.TOP)


with BuildPart() as f11_tool126:
    # F11_s127 → F11_t128 (new body)
    with BuildSketch(Plane(origin=(60.0288587366, 0, -60.0288587366), x_dir=(0, 1, 0), z_dir=(-0.7071067812, 0, 0.7071067812))):
        with BuildLine():
            ThreePointArc((25.070781447, 17.6013232071), (24.7778882282, 16.8942164259), (24.070781447, 16.6013232071))
            Line((24.070781447, 16.6013232071), (25.070781447, 16.6013232071))
            Line((25.070781447, 16.6013232071), (25.070781447, 17.6013232071))
        make_face()
    extrude(amount=F11_T128_DEPTH)

    split(bisect_by=Plane.YZ.offset(46.5221835672), keep=Keep.TOP)


with BuildPart() as f11_tool122_1:
    add(f11_tool122.part)

    # F11_t130: intersect F11_tool126
    add(f11_tool126.part, mode=Mode.INTERSECT)


with BuildPart() as f1_15:
    add(f1_14.part)

    # F11_t120: cut F11_tool122
    add(f11_tool122_1.part, mode=Mode.SUBTRACT)


with BuildPart() as f11_tool133:
    # F11_s134 → F11_t135 (new body)
    with BuildSketch(Plane(origin=(60.0288587366, 0, -60.0288587366), x_dir=(0, 1, 0), z_dir=(-0.7071067812, 0, 0.7071067812))):
        with BuildLine():
            ThreePointArc((25.070781447, 17.6013232071), (24.7778882282, 16.8942164259), (24.070781447, 16.6013232071))
            Line((24.070781447, 16.6013232071), (25.070781447, 16.6013232071))
            Line((25.070781447, 16.6013232071), (25.070781447, 17.6013232071))
        make_face()
    extrude(amount=F11_T135_DEPTH)

    split(bisect_by=Plane.XY, keep=Keep.TOP)


with BuildPart() as f11_tool137:
    # F11_s138 → F11_t139 (new body)
    with BuildSketch(Plane.YZ.offset(-25.9778164328)):
        with BuildLine():
            ThreePointArc((25.070781447, 1), (24.7778882282, 0.2928932188), (24.070781447, 0))
            Line((24.070781447, 0), (25.070781447, 0))
            Line((25.070781447, 0), (25.070781447, 1))
        make_face()
    extrude(amount=F11_T139_DEPTH)

    split(bisect_by=Plane(origin=(-11.7389082164, 0, -11.7389082164), x_dir=(0, 1, 0), z_dir=(-0.7071067812, 0, -0.7071067812)), keep=Keep.TOP)


with BuildPart() as f11_tool133_1:
    add(f11_tool133.part)

    # F11_t141: intersect F11_tool137
    add(f11_tool137.part, mode=Mode.INTERSECT)


with BuildPart() as f1_16:
    add(f1_15.part)

    # F11_t131: cut F11_tool133
    add(f11_tool133_1.part, mode=Mode.SUBTRACT)


solid = f1_16.part
